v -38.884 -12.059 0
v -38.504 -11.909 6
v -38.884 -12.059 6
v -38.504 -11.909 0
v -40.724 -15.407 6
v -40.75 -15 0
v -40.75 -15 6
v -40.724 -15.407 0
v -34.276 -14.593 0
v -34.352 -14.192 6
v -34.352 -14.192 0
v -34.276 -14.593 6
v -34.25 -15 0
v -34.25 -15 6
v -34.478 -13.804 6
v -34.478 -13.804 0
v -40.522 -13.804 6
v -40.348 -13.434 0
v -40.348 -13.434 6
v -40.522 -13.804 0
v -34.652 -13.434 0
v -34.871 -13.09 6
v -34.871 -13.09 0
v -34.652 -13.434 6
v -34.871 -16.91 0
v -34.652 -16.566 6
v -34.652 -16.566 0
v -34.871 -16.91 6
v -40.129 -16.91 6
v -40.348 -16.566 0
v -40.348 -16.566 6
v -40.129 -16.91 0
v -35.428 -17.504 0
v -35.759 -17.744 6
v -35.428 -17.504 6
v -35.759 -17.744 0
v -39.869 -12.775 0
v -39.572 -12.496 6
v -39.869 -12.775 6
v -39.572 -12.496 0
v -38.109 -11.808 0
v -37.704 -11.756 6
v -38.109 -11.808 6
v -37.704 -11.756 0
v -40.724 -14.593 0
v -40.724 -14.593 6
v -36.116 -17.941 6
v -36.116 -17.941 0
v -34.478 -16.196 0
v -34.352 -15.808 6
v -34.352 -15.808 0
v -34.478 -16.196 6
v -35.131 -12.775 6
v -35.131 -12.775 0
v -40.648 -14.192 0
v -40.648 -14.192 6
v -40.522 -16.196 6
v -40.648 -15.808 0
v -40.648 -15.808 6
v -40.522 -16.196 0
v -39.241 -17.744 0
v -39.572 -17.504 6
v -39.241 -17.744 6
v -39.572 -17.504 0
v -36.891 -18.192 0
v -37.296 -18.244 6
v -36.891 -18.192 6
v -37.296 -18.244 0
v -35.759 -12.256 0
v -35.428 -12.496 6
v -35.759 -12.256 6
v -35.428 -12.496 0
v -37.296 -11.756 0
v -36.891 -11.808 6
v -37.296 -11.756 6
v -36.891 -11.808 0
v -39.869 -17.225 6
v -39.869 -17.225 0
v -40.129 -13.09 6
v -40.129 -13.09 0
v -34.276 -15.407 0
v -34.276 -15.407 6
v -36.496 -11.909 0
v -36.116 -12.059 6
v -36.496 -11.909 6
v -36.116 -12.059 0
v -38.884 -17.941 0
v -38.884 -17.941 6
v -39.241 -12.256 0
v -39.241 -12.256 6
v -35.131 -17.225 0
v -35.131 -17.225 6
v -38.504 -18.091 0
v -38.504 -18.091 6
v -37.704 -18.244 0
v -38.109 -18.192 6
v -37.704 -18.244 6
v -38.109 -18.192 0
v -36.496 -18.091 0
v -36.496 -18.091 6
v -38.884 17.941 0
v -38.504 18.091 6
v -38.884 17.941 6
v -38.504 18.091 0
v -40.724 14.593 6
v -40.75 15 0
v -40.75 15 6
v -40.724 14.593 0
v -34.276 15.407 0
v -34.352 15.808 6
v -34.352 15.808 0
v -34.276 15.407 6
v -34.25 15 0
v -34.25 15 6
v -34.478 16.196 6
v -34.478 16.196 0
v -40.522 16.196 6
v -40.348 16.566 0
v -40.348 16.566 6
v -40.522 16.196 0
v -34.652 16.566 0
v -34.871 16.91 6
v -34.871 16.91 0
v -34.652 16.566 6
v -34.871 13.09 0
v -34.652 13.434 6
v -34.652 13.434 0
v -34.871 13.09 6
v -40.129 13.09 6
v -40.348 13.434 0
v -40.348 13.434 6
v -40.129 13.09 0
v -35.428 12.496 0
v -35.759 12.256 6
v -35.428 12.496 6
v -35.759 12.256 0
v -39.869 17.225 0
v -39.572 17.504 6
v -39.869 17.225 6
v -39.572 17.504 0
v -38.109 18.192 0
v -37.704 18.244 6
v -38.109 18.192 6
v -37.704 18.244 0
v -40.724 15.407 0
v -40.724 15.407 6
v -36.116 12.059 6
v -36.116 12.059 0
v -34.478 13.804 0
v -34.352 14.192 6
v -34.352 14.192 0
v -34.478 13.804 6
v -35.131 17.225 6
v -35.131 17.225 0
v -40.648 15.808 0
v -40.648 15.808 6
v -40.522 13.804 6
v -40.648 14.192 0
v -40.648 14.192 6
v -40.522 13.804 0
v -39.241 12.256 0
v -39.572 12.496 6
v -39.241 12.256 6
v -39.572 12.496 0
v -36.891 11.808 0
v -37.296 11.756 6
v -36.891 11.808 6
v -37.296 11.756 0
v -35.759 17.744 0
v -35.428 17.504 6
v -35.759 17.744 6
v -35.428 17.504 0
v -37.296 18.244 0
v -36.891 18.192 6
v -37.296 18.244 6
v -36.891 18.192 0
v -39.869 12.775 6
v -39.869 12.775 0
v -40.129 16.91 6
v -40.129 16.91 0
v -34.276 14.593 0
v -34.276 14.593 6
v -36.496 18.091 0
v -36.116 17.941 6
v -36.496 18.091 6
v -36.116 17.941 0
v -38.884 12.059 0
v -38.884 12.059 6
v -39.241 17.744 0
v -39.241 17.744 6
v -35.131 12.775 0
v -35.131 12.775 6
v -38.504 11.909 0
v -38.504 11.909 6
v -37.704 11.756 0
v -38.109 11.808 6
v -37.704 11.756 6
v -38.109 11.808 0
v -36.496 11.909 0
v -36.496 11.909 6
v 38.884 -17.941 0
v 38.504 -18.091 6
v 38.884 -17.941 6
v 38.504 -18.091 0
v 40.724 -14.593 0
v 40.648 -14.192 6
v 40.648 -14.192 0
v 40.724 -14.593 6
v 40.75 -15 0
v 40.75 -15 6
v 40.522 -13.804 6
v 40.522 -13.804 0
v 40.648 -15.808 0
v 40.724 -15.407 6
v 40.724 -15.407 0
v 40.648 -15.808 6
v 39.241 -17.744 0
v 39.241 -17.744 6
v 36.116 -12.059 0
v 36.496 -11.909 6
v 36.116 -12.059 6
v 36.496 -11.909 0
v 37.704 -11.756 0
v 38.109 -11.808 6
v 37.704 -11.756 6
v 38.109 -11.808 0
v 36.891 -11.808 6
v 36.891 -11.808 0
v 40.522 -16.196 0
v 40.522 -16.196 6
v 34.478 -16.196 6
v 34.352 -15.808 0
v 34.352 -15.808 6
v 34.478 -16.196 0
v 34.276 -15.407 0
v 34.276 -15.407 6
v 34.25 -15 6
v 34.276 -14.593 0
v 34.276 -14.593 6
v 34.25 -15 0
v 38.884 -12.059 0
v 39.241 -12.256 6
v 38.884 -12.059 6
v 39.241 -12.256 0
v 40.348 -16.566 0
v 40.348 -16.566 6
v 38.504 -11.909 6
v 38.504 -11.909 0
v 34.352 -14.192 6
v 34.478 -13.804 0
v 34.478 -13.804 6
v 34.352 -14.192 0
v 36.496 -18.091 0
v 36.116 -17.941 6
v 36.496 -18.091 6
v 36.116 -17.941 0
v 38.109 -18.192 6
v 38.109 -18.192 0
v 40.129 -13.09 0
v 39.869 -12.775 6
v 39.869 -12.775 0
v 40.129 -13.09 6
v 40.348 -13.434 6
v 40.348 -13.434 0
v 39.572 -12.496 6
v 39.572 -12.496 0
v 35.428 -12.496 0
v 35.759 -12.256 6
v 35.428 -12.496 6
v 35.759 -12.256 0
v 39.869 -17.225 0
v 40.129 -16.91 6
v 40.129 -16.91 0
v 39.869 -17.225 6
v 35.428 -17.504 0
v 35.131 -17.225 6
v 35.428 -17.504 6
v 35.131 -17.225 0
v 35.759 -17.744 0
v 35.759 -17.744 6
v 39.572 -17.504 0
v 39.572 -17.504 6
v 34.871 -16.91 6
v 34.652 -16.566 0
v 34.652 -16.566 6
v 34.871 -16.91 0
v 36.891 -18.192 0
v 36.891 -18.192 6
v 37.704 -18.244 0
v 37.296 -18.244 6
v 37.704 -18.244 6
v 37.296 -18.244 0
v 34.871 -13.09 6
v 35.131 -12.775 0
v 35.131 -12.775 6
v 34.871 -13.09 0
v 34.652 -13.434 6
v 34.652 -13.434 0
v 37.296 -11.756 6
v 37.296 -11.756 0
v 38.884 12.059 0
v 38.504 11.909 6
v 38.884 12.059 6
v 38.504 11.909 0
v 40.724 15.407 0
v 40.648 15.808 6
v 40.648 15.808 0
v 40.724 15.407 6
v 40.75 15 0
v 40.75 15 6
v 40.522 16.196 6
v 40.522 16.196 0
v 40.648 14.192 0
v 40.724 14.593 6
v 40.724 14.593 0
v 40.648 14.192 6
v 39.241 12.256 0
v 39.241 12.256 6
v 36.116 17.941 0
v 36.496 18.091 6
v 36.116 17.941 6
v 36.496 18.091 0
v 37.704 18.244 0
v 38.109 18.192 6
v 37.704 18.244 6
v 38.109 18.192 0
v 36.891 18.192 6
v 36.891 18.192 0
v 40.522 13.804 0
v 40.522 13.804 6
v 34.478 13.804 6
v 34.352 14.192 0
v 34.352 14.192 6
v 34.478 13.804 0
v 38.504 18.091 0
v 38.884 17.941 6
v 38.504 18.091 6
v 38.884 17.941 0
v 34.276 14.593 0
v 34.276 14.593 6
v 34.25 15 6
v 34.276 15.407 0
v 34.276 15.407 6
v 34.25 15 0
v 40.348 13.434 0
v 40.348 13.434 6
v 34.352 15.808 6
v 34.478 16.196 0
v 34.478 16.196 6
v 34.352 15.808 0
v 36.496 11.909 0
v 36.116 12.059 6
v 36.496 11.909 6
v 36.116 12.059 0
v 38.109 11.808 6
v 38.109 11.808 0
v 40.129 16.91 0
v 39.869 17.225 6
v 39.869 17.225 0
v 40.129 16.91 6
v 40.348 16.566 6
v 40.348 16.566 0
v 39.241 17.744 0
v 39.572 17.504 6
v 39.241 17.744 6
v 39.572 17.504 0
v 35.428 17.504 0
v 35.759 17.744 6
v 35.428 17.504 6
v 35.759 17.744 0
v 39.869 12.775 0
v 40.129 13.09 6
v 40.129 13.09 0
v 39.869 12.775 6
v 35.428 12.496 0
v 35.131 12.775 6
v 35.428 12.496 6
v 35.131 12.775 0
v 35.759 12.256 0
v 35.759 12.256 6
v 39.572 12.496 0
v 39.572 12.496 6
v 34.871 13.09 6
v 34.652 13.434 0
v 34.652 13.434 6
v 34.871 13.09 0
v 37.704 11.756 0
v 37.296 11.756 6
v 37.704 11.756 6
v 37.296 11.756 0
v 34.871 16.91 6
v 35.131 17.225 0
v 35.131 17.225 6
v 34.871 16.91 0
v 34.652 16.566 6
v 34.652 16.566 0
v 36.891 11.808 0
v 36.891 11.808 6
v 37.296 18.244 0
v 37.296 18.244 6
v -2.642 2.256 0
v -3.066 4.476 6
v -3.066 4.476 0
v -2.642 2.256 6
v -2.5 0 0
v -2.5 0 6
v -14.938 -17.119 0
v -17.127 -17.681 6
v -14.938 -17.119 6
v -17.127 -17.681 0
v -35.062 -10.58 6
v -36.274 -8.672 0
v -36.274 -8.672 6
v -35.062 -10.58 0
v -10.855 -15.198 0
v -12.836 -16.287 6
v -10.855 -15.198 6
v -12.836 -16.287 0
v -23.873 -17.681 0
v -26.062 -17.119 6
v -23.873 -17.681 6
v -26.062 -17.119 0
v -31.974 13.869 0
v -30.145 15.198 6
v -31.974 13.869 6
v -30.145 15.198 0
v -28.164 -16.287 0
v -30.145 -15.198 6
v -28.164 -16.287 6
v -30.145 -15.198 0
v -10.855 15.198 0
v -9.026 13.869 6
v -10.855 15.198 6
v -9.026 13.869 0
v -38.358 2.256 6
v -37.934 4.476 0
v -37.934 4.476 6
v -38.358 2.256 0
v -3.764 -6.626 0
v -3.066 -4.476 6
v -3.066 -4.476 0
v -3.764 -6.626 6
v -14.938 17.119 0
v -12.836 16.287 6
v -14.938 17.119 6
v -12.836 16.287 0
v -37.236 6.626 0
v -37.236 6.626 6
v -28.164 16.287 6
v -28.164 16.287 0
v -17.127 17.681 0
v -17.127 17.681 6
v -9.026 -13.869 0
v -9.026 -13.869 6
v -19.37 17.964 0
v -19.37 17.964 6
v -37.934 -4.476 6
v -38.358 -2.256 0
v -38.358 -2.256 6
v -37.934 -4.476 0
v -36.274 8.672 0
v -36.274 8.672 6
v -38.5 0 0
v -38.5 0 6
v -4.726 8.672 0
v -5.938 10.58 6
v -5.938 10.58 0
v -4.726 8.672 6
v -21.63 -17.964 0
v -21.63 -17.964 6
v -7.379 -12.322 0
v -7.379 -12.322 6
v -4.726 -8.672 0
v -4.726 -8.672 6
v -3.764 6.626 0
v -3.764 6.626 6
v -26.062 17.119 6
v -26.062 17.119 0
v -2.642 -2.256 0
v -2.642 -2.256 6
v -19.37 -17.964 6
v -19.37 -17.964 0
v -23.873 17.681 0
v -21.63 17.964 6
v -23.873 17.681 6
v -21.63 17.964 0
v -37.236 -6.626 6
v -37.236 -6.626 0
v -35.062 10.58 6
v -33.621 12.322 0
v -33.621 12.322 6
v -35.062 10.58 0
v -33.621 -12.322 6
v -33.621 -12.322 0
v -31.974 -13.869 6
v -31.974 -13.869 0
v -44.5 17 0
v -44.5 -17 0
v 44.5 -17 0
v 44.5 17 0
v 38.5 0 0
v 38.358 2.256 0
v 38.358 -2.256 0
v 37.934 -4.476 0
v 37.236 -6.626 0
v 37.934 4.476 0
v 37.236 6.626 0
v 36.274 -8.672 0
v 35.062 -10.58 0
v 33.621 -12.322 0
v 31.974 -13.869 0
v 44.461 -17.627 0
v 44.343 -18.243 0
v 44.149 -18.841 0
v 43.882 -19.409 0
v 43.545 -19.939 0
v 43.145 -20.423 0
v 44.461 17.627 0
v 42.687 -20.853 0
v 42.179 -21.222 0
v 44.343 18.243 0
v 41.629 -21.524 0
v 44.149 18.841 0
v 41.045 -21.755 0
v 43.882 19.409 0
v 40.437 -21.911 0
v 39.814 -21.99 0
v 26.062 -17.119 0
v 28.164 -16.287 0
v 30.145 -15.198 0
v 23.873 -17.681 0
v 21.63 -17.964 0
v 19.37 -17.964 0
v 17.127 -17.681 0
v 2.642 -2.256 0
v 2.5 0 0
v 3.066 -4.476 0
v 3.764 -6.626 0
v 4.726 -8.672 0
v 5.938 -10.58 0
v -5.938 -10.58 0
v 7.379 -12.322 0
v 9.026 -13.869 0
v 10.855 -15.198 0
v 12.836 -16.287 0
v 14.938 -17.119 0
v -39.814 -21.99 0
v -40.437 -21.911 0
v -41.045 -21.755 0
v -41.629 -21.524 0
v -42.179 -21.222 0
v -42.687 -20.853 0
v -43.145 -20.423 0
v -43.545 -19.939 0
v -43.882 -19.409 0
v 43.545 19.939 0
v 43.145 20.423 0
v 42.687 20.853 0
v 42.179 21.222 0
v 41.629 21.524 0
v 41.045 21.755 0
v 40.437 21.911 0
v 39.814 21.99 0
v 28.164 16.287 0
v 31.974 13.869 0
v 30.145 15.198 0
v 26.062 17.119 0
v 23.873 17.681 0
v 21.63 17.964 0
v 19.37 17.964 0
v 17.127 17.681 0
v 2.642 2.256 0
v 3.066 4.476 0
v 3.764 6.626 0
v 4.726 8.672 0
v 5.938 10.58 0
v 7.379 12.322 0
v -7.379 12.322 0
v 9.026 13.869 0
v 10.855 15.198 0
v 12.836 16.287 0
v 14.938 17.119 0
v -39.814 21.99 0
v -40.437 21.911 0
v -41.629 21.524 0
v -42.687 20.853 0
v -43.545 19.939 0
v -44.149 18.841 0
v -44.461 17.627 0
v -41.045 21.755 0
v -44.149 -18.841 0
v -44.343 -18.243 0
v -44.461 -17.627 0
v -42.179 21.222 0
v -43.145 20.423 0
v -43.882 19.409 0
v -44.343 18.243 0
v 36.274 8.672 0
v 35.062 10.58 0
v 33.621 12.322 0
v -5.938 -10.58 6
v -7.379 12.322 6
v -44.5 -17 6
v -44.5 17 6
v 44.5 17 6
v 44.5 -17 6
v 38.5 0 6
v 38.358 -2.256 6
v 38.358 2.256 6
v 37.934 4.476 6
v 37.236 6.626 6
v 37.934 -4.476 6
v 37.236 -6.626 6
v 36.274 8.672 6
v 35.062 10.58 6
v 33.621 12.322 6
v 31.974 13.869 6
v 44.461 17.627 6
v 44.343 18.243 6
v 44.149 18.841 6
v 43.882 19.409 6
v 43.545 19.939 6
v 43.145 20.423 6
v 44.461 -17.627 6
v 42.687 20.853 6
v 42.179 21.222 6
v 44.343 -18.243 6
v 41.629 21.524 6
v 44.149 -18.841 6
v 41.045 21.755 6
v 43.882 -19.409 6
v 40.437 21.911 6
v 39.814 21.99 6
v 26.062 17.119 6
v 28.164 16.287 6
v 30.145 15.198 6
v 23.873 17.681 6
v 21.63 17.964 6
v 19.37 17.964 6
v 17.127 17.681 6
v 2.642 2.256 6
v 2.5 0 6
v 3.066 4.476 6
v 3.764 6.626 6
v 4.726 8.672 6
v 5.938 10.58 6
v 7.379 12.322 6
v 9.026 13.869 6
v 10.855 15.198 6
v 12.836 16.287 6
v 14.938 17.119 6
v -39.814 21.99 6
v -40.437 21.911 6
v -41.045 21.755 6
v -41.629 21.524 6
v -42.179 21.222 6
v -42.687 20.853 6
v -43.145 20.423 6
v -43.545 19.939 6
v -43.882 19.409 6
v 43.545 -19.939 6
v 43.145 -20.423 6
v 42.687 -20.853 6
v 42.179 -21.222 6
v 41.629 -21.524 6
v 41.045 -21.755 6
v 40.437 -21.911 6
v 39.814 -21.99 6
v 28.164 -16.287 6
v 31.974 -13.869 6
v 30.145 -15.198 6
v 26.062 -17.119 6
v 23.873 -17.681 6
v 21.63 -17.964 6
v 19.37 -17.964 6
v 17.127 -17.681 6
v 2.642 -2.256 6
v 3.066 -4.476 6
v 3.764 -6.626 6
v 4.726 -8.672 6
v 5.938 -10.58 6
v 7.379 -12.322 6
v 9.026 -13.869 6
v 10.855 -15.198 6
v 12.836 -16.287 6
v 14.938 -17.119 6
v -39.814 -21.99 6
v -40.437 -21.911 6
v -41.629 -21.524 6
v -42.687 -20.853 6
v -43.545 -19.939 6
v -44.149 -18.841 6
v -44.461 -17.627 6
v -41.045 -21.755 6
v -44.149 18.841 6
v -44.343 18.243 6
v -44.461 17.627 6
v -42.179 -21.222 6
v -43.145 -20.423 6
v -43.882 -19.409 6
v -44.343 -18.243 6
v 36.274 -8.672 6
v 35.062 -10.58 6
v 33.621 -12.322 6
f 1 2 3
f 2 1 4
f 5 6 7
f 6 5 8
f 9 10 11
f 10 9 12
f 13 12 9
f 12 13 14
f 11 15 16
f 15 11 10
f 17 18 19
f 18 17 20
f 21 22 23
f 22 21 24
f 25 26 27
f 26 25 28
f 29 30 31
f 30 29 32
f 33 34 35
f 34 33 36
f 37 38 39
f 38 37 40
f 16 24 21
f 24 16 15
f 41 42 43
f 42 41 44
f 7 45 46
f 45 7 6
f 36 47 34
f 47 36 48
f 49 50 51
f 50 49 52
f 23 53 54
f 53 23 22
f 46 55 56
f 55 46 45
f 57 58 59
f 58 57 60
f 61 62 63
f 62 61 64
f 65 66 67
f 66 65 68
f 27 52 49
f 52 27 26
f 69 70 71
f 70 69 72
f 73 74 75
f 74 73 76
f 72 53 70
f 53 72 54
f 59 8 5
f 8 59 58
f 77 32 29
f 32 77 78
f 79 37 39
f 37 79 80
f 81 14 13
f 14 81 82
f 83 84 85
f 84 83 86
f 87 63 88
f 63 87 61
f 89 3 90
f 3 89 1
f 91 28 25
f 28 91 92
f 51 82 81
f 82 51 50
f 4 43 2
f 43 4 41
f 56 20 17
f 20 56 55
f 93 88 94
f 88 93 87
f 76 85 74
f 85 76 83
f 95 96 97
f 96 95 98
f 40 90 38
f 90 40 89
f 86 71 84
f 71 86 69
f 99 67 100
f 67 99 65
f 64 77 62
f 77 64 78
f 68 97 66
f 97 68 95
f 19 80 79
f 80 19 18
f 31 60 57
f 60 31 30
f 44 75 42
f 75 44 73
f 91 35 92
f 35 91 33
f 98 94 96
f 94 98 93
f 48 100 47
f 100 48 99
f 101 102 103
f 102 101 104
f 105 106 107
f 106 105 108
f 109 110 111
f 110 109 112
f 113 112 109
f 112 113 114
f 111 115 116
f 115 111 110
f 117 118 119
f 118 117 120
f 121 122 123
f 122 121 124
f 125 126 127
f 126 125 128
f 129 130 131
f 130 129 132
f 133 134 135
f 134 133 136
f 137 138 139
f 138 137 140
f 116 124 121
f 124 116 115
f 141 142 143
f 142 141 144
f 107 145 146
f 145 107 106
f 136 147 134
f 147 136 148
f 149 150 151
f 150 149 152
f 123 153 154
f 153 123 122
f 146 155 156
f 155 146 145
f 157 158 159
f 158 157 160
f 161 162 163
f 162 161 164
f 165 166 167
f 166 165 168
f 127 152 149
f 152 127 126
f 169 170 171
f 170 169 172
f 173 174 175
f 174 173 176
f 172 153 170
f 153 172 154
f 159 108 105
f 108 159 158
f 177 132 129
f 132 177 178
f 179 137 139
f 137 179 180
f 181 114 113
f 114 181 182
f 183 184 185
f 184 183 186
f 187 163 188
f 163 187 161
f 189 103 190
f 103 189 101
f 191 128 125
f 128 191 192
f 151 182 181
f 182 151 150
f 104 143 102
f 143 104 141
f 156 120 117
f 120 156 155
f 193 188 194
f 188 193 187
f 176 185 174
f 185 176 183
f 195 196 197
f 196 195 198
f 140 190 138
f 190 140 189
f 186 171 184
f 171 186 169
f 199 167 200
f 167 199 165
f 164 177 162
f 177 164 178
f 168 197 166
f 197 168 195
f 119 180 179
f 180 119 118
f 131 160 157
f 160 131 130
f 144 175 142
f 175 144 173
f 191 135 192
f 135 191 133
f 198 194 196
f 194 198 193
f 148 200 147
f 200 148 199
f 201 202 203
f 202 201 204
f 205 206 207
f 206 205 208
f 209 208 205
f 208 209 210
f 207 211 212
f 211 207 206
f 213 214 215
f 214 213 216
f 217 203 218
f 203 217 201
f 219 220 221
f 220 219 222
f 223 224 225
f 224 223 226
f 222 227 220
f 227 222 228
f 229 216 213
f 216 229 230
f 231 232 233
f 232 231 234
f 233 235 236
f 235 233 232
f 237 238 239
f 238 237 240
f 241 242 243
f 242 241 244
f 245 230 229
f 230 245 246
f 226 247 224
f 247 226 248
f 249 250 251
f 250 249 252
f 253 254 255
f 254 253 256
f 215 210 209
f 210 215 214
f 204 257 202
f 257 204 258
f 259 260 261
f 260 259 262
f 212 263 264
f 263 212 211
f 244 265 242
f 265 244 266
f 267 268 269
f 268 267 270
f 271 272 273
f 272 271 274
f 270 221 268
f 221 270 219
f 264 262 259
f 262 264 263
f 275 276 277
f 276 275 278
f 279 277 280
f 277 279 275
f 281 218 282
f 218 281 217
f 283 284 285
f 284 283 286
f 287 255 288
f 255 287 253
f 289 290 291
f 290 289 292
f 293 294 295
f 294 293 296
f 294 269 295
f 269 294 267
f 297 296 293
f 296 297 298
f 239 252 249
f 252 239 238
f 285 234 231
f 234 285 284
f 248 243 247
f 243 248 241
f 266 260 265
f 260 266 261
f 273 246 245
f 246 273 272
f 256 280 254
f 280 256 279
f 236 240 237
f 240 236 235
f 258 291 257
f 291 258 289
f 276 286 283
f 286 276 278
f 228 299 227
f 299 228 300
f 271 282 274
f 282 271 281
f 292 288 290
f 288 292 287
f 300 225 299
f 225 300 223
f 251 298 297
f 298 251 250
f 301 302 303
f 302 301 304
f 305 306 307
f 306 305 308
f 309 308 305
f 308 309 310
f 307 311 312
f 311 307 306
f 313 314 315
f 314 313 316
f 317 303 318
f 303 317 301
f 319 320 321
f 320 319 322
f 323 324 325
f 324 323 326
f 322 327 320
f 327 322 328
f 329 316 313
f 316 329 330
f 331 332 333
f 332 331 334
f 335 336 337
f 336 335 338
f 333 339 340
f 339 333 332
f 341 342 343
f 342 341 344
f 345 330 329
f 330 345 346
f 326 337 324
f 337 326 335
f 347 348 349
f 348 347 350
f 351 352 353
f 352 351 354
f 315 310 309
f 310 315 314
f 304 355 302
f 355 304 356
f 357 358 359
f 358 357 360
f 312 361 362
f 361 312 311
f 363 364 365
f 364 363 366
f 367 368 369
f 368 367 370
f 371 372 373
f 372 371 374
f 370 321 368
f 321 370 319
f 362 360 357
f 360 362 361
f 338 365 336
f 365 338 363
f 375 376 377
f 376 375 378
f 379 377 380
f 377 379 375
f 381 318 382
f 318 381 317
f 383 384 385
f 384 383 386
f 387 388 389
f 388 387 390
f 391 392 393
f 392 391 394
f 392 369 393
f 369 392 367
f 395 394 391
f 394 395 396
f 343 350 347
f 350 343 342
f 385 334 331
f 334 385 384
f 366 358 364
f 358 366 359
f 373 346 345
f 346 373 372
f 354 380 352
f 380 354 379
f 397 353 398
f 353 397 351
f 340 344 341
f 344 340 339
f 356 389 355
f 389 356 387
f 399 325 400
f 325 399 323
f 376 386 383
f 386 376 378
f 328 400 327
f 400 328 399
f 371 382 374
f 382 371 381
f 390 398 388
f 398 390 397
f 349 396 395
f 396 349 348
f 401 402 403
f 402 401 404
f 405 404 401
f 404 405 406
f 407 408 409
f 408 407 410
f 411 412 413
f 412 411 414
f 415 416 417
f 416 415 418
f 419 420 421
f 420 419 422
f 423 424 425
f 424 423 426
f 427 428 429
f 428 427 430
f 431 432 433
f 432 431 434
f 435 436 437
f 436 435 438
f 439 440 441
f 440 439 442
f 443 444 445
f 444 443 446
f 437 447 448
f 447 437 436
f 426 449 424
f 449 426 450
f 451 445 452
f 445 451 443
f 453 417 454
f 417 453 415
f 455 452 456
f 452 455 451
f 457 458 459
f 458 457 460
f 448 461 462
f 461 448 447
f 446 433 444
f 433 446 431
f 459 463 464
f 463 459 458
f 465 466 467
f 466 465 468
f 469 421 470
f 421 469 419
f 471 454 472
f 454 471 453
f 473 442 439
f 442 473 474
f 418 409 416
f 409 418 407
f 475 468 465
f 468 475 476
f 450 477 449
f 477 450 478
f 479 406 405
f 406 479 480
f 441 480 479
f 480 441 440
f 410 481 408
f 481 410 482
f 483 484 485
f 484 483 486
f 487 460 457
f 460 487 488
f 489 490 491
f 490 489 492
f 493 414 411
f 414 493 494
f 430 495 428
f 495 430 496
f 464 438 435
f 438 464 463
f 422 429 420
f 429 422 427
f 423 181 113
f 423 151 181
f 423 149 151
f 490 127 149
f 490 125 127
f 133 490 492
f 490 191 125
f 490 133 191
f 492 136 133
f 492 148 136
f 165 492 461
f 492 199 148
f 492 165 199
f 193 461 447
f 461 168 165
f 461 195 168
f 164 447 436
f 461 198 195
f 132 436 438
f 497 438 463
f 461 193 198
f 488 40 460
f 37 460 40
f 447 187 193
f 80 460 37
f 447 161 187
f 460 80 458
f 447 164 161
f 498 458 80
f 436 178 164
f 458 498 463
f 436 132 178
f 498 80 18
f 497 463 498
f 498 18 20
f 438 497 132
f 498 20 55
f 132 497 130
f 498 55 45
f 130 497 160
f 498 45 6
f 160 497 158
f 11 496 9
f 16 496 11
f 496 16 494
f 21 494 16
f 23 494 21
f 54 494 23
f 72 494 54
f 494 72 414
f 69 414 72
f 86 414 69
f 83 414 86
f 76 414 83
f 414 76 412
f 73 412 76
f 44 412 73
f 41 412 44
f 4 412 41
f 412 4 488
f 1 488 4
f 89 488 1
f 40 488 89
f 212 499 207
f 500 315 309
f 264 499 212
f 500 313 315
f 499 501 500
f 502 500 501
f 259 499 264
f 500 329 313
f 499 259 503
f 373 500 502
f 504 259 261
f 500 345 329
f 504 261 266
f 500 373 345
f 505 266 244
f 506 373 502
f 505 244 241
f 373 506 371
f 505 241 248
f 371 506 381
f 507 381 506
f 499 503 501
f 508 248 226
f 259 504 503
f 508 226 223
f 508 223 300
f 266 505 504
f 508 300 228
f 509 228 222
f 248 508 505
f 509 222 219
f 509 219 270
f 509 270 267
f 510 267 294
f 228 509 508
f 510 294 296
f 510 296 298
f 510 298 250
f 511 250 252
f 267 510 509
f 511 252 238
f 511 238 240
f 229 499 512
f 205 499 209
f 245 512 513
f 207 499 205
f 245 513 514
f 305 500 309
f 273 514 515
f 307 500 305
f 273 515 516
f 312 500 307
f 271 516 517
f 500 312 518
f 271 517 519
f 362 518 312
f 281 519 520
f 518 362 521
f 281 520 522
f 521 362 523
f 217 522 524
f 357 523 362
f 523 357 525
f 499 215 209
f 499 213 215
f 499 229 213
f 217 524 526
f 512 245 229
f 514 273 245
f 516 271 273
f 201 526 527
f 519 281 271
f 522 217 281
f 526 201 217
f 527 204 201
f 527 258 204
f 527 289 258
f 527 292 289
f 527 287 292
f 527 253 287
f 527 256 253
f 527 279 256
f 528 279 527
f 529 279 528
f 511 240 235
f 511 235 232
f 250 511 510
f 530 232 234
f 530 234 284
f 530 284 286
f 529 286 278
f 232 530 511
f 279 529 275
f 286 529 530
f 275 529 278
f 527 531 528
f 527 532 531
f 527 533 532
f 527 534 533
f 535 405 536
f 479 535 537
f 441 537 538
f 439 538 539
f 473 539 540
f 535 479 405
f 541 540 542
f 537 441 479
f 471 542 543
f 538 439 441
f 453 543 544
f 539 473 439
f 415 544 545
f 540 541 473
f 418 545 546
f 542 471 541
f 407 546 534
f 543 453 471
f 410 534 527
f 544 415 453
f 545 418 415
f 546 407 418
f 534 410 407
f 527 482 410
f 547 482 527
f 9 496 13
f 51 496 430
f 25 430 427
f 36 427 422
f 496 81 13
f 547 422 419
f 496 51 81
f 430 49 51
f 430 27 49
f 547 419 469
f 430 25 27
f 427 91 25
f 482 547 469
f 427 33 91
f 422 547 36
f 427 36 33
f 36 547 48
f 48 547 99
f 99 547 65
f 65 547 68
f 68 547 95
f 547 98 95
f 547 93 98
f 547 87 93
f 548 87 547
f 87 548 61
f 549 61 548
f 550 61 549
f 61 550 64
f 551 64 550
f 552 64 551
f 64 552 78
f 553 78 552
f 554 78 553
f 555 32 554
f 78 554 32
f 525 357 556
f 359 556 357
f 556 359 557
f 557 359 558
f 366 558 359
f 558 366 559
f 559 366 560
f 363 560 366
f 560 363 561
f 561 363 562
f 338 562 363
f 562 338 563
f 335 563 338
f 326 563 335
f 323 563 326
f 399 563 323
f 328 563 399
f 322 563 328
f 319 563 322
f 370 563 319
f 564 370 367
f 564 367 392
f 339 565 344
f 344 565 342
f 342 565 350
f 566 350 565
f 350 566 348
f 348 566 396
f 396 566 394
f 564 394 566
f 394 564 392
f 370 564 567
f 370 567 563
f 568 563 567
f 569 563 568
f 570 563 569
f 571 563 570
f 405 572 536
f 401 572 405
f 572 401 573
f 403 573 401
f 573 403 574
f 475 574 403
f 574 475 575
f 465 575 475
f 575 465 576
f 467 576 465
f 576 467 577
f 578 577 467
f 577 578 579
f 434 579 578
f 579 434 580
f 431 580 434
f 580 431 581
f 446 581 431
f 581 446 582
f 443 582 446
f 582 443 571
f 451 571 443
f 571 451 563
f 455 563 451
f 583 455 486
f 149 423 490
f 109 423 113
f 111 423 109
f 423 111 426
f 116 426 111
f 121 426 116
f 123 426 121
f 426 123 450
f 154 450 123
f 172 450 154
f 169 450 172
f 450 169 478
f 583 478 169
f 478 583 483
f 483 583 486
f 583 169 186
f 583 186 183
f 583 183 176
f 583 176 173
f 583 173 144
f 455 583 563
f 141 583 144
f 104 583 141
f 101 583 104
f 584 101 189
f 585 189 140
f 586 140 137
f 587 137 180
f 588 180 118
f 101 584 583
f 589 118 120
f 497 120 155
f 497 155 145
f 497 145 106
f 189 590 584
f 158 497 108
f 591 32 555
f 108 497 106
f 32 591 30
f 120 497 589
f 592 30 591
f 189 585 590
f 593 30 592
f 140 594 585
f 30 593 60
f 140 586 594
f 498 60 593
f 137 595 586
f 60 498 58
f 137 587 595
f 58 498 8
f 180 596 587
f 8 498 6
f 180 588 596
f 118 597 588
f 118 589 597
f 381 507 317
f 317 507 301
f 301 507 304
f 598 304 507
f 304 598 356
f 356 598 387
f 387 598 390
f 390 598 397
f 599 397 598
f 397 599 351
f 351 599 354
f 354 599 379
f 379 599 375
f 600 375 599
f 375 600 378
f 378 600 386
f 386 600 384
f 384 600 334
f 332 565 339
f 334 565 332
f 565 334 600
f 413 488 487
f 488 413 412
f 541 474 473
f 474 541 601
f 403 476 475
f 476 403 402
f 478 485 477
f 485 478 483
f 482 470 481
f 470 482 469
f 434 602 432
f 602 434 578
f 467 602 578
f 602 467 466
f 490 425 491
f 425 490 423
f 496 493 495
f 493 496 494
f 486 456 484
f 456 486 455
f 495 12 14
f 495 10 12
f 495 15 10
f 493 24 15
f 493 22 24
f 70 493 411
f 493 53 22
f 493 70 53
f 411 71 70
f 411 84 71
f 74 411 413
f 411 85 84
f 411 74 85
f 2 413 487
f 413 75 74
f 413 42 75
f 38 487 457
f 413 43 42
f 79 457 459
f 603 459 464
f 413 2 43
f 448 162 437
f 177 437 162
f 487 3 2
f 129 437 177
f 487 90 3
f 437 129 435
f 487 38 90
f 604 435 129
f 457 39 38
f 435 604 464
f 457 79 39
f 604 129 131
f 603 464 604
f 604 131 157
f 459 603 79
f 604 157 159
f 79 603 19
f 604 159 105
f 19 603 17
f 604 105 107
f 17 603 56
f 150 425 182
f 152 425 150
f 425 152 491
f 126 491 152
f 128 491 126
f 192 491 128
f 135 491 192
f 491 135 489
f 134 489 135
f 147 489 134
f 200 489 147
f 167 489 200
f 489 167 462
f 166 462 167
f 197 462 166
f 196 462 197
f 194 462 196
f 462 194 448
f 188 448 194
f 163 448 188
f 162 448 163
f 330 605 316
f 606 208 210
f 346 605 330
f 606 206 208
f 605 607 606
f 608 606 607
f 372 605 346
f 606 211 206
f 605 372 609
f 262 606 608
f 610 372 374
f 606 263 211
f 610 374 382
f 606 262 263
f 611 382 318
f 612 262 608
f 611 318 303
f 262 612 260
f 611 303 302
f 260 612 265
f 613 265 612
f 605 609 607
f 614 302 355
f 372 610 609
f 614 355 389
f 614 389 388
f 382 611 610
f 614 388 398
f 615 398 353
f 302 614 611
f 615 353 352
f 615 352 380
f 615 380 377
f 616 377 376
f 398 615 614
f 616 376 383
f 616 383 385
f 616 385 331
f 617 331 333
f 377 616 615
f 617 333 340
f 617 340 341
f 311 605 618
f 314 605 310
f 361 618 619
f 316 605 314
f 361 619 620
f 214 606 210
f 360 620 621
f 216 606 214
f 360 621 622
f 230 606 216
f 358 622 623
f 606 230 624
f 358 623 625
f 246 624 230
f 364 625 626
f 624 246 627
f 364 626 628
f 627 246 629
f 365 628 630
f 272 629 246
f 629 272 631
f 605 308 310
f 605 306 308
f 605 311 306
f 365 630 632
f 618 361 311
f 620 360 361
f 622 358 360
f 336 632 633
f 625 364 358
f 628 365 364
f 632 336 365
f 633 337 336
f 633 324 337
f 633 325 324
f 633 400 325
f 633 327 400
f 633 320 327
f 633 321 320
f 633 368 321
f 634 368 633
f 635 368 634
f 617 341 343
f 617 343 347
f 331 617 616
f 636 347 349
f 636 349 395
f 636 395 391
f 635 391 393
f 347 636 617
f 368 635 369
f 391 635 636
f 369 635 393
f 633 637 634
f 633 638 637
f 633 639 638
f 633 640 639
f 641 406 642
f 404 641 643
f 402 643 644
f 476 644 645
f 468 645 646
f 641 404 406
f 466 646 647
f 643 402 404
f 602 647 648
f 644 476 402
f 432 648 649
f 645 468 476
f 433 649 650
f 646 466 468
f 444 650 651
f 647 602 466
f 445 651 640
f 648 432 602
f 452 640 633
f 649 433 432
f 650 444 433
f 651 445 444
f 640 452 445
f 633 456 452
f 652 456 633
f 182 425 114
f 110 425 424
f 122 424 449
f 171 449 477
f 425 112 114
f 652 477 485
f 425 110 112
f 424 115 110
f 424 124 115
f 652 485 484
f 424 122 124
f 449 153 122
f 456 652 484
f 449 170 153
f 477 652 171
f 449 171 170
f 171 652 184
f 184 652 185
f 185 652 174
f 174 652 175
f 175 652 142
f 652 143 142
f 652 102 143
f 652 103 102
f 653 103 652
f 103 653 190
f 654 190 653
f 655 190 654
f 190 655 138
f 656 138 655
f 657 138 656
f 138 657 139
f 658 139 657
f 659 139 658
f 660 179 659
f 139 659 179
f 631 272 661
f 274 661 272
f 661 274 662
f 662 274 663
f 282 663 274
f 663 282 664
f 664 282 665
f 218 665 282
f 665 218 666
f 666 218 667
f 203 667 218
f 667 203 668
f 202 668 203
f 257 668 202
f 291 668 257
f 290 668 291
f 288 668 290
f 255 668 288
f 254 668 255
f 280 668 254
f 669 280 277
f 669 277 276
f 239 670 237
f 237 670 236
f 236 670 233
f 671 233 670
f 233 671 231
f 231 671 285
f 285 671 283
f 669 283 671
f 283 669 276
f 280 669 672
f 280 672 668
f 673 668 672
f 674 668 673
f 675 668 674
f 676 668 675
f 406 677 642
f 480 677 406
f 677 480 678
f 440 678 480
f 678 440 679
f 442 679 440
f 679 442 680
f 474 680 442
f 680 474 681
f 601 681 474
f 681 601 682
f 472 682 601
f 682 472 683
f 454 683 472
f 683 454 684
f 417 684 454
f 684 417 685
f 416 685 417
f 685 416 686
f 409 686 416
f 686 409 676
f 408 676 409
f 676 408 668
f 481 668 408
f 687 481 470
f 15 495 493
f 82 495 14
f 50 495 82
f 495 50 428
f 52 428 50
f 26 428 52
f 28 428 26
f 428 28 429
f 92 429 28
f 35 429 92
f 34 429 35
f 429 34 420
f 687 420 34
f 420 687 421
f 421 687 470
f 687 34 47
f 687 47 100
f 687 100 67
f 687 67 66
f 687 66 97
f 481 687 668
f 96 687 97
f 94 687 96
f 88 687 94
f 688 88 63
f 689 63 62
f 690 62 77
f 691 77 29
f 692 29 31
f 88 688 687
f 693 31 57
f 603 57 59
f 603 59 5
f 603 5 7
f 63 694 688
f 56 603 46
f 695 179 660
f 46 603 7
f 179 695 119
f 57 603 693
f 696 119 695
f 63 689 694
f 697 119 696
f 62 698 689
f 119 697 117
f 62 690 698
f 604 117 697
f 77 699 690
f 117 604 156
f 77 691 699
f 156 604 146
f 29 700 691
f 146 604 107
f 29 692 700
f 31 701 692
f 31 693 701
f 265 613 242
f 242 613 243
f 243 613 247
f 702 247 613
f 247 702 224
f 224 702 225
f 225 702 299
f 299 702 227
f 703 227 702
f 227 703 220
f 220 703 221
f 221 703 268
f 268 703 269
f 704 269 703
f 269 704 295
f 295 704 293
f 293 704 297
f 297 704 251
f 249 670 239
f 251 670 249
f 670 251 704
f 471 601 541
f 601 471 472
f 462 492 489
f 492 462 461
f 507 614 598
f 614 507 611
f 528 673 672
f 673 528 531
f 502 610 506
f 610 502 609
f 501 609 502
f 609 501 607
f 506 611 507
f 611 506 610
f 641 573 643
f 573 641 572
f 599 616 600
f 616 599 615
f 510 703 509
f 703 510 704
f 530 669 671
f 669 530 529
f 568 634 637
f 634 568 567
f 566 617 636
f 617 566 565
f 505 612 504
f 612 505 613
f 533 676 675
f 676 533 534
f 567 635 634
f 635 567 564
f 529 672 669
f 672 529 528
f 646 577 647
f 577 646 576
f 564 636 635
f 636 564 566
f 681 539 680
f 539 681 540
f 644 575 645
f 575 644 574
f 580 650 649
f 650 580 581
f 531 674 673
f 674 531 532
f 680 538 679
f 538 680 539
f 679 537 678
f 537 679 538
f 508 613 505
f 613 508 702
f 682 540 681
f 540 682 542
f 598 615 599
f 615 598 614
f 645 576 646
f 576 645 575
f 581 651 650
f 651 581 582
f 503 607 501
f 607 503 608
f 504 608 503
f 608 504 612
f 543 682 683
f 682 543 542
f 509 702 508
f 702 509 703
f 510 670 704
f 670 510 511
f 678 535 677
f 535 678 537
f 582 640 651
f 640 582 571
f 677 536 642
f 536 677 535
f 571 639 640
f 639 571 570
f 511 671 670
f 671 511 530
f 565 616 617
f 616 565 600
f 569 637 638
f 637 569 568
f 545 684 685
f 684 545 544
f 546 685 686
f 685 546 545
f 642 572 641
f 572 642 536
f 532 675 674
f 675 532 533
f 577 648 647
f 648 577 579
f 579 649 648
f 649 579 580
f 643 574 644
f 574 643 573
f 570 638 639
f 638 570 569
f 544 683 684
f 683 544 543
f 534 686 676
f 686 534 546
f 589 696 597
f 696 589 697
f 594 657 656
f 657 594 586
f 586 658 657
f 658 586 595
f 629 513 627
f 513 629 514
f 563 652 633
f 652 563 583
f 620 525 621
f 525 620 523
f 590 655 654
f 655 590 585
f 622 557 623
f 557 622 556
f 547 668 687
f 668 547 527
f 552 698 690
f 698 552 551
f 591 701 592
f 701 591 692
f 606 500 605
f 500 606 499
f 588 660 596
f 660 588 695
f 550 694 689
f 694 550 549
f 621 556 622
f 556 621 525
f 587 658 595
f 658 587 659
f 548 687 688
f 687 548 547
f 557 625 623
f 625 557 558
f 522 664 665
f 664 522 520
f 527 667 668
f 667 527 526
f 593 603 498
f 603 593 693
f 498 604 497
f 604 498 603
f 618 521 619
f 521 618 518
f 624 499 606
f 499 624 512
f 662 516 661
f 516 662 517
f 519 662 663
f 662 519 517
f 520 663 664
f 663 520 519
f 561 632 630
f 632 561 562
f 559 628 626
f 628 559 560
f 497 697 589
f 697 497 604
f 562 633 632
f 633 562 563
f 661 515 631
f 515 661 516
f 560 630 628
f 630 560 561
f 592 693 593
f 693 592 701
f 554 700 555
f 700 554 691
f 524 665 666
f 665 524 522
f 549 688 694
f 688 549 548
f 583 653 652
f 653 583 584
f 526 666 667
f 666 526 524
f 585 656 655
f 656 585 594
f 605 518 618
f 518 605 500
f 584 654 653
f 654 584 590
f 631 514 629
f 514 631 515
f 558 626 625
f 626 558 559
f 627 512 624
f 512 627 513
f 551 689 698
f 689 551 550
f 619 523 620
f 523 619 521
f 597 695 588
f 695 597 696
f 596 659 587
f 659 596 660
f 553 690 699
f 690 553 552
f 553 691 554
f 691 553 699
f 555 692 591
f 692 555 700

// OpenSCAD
$fn = 50;


difference() {
	union() {
		hull() {
			translate(v = [-39.5000000000, 17.0000000000, 0]) {
				cylinder(h = 6, r = 5);
			}
			translate(v = [39.5000000000, 17.0000000000, 0]) {
				cylinder(h = 6, r = 5);
			}
			translate(v = [-39.5000000000, -17.0000000000, 0]) {
				cylinder(h = 6, r = 5);
			}
			translate(v = [39.5000000000, -17.0000000000, 0]) {
				cylinder(h = 6, r = 5);
			}
		}
	}
	union() {
		#translate(v = [-37.5000000000, -15.0000000000, -100.0000000000]) {
			cylinder(h = 200, r = 3.2500000000);
		}
		#translate(v = [-37.5000000000, 15.0000000000, -100.0000000000]) {
			cylinder(h = 200, r = 3.2500000000);
		}
		#translate(v = [37.5000000000, -15.0000000000, -100.0000000000]) {
			cylinder(h = 200, r = 3.2500000000);
		}
		#translate(v = [37.5000000000, 15.0000000000, -100.0000000000]) {
			cylinder(h = 200, r = 3.2500000000);
		}
		#translate(v = [-20.5000000000, 0, 0]) {
			cylinder(h = 6, r = 18.0000000000);
		}
		#translate(v = [20.5000000000, 0, 0]) {
			cylinder(h = 6, r = 18.0000000000);
		}
	}
}
